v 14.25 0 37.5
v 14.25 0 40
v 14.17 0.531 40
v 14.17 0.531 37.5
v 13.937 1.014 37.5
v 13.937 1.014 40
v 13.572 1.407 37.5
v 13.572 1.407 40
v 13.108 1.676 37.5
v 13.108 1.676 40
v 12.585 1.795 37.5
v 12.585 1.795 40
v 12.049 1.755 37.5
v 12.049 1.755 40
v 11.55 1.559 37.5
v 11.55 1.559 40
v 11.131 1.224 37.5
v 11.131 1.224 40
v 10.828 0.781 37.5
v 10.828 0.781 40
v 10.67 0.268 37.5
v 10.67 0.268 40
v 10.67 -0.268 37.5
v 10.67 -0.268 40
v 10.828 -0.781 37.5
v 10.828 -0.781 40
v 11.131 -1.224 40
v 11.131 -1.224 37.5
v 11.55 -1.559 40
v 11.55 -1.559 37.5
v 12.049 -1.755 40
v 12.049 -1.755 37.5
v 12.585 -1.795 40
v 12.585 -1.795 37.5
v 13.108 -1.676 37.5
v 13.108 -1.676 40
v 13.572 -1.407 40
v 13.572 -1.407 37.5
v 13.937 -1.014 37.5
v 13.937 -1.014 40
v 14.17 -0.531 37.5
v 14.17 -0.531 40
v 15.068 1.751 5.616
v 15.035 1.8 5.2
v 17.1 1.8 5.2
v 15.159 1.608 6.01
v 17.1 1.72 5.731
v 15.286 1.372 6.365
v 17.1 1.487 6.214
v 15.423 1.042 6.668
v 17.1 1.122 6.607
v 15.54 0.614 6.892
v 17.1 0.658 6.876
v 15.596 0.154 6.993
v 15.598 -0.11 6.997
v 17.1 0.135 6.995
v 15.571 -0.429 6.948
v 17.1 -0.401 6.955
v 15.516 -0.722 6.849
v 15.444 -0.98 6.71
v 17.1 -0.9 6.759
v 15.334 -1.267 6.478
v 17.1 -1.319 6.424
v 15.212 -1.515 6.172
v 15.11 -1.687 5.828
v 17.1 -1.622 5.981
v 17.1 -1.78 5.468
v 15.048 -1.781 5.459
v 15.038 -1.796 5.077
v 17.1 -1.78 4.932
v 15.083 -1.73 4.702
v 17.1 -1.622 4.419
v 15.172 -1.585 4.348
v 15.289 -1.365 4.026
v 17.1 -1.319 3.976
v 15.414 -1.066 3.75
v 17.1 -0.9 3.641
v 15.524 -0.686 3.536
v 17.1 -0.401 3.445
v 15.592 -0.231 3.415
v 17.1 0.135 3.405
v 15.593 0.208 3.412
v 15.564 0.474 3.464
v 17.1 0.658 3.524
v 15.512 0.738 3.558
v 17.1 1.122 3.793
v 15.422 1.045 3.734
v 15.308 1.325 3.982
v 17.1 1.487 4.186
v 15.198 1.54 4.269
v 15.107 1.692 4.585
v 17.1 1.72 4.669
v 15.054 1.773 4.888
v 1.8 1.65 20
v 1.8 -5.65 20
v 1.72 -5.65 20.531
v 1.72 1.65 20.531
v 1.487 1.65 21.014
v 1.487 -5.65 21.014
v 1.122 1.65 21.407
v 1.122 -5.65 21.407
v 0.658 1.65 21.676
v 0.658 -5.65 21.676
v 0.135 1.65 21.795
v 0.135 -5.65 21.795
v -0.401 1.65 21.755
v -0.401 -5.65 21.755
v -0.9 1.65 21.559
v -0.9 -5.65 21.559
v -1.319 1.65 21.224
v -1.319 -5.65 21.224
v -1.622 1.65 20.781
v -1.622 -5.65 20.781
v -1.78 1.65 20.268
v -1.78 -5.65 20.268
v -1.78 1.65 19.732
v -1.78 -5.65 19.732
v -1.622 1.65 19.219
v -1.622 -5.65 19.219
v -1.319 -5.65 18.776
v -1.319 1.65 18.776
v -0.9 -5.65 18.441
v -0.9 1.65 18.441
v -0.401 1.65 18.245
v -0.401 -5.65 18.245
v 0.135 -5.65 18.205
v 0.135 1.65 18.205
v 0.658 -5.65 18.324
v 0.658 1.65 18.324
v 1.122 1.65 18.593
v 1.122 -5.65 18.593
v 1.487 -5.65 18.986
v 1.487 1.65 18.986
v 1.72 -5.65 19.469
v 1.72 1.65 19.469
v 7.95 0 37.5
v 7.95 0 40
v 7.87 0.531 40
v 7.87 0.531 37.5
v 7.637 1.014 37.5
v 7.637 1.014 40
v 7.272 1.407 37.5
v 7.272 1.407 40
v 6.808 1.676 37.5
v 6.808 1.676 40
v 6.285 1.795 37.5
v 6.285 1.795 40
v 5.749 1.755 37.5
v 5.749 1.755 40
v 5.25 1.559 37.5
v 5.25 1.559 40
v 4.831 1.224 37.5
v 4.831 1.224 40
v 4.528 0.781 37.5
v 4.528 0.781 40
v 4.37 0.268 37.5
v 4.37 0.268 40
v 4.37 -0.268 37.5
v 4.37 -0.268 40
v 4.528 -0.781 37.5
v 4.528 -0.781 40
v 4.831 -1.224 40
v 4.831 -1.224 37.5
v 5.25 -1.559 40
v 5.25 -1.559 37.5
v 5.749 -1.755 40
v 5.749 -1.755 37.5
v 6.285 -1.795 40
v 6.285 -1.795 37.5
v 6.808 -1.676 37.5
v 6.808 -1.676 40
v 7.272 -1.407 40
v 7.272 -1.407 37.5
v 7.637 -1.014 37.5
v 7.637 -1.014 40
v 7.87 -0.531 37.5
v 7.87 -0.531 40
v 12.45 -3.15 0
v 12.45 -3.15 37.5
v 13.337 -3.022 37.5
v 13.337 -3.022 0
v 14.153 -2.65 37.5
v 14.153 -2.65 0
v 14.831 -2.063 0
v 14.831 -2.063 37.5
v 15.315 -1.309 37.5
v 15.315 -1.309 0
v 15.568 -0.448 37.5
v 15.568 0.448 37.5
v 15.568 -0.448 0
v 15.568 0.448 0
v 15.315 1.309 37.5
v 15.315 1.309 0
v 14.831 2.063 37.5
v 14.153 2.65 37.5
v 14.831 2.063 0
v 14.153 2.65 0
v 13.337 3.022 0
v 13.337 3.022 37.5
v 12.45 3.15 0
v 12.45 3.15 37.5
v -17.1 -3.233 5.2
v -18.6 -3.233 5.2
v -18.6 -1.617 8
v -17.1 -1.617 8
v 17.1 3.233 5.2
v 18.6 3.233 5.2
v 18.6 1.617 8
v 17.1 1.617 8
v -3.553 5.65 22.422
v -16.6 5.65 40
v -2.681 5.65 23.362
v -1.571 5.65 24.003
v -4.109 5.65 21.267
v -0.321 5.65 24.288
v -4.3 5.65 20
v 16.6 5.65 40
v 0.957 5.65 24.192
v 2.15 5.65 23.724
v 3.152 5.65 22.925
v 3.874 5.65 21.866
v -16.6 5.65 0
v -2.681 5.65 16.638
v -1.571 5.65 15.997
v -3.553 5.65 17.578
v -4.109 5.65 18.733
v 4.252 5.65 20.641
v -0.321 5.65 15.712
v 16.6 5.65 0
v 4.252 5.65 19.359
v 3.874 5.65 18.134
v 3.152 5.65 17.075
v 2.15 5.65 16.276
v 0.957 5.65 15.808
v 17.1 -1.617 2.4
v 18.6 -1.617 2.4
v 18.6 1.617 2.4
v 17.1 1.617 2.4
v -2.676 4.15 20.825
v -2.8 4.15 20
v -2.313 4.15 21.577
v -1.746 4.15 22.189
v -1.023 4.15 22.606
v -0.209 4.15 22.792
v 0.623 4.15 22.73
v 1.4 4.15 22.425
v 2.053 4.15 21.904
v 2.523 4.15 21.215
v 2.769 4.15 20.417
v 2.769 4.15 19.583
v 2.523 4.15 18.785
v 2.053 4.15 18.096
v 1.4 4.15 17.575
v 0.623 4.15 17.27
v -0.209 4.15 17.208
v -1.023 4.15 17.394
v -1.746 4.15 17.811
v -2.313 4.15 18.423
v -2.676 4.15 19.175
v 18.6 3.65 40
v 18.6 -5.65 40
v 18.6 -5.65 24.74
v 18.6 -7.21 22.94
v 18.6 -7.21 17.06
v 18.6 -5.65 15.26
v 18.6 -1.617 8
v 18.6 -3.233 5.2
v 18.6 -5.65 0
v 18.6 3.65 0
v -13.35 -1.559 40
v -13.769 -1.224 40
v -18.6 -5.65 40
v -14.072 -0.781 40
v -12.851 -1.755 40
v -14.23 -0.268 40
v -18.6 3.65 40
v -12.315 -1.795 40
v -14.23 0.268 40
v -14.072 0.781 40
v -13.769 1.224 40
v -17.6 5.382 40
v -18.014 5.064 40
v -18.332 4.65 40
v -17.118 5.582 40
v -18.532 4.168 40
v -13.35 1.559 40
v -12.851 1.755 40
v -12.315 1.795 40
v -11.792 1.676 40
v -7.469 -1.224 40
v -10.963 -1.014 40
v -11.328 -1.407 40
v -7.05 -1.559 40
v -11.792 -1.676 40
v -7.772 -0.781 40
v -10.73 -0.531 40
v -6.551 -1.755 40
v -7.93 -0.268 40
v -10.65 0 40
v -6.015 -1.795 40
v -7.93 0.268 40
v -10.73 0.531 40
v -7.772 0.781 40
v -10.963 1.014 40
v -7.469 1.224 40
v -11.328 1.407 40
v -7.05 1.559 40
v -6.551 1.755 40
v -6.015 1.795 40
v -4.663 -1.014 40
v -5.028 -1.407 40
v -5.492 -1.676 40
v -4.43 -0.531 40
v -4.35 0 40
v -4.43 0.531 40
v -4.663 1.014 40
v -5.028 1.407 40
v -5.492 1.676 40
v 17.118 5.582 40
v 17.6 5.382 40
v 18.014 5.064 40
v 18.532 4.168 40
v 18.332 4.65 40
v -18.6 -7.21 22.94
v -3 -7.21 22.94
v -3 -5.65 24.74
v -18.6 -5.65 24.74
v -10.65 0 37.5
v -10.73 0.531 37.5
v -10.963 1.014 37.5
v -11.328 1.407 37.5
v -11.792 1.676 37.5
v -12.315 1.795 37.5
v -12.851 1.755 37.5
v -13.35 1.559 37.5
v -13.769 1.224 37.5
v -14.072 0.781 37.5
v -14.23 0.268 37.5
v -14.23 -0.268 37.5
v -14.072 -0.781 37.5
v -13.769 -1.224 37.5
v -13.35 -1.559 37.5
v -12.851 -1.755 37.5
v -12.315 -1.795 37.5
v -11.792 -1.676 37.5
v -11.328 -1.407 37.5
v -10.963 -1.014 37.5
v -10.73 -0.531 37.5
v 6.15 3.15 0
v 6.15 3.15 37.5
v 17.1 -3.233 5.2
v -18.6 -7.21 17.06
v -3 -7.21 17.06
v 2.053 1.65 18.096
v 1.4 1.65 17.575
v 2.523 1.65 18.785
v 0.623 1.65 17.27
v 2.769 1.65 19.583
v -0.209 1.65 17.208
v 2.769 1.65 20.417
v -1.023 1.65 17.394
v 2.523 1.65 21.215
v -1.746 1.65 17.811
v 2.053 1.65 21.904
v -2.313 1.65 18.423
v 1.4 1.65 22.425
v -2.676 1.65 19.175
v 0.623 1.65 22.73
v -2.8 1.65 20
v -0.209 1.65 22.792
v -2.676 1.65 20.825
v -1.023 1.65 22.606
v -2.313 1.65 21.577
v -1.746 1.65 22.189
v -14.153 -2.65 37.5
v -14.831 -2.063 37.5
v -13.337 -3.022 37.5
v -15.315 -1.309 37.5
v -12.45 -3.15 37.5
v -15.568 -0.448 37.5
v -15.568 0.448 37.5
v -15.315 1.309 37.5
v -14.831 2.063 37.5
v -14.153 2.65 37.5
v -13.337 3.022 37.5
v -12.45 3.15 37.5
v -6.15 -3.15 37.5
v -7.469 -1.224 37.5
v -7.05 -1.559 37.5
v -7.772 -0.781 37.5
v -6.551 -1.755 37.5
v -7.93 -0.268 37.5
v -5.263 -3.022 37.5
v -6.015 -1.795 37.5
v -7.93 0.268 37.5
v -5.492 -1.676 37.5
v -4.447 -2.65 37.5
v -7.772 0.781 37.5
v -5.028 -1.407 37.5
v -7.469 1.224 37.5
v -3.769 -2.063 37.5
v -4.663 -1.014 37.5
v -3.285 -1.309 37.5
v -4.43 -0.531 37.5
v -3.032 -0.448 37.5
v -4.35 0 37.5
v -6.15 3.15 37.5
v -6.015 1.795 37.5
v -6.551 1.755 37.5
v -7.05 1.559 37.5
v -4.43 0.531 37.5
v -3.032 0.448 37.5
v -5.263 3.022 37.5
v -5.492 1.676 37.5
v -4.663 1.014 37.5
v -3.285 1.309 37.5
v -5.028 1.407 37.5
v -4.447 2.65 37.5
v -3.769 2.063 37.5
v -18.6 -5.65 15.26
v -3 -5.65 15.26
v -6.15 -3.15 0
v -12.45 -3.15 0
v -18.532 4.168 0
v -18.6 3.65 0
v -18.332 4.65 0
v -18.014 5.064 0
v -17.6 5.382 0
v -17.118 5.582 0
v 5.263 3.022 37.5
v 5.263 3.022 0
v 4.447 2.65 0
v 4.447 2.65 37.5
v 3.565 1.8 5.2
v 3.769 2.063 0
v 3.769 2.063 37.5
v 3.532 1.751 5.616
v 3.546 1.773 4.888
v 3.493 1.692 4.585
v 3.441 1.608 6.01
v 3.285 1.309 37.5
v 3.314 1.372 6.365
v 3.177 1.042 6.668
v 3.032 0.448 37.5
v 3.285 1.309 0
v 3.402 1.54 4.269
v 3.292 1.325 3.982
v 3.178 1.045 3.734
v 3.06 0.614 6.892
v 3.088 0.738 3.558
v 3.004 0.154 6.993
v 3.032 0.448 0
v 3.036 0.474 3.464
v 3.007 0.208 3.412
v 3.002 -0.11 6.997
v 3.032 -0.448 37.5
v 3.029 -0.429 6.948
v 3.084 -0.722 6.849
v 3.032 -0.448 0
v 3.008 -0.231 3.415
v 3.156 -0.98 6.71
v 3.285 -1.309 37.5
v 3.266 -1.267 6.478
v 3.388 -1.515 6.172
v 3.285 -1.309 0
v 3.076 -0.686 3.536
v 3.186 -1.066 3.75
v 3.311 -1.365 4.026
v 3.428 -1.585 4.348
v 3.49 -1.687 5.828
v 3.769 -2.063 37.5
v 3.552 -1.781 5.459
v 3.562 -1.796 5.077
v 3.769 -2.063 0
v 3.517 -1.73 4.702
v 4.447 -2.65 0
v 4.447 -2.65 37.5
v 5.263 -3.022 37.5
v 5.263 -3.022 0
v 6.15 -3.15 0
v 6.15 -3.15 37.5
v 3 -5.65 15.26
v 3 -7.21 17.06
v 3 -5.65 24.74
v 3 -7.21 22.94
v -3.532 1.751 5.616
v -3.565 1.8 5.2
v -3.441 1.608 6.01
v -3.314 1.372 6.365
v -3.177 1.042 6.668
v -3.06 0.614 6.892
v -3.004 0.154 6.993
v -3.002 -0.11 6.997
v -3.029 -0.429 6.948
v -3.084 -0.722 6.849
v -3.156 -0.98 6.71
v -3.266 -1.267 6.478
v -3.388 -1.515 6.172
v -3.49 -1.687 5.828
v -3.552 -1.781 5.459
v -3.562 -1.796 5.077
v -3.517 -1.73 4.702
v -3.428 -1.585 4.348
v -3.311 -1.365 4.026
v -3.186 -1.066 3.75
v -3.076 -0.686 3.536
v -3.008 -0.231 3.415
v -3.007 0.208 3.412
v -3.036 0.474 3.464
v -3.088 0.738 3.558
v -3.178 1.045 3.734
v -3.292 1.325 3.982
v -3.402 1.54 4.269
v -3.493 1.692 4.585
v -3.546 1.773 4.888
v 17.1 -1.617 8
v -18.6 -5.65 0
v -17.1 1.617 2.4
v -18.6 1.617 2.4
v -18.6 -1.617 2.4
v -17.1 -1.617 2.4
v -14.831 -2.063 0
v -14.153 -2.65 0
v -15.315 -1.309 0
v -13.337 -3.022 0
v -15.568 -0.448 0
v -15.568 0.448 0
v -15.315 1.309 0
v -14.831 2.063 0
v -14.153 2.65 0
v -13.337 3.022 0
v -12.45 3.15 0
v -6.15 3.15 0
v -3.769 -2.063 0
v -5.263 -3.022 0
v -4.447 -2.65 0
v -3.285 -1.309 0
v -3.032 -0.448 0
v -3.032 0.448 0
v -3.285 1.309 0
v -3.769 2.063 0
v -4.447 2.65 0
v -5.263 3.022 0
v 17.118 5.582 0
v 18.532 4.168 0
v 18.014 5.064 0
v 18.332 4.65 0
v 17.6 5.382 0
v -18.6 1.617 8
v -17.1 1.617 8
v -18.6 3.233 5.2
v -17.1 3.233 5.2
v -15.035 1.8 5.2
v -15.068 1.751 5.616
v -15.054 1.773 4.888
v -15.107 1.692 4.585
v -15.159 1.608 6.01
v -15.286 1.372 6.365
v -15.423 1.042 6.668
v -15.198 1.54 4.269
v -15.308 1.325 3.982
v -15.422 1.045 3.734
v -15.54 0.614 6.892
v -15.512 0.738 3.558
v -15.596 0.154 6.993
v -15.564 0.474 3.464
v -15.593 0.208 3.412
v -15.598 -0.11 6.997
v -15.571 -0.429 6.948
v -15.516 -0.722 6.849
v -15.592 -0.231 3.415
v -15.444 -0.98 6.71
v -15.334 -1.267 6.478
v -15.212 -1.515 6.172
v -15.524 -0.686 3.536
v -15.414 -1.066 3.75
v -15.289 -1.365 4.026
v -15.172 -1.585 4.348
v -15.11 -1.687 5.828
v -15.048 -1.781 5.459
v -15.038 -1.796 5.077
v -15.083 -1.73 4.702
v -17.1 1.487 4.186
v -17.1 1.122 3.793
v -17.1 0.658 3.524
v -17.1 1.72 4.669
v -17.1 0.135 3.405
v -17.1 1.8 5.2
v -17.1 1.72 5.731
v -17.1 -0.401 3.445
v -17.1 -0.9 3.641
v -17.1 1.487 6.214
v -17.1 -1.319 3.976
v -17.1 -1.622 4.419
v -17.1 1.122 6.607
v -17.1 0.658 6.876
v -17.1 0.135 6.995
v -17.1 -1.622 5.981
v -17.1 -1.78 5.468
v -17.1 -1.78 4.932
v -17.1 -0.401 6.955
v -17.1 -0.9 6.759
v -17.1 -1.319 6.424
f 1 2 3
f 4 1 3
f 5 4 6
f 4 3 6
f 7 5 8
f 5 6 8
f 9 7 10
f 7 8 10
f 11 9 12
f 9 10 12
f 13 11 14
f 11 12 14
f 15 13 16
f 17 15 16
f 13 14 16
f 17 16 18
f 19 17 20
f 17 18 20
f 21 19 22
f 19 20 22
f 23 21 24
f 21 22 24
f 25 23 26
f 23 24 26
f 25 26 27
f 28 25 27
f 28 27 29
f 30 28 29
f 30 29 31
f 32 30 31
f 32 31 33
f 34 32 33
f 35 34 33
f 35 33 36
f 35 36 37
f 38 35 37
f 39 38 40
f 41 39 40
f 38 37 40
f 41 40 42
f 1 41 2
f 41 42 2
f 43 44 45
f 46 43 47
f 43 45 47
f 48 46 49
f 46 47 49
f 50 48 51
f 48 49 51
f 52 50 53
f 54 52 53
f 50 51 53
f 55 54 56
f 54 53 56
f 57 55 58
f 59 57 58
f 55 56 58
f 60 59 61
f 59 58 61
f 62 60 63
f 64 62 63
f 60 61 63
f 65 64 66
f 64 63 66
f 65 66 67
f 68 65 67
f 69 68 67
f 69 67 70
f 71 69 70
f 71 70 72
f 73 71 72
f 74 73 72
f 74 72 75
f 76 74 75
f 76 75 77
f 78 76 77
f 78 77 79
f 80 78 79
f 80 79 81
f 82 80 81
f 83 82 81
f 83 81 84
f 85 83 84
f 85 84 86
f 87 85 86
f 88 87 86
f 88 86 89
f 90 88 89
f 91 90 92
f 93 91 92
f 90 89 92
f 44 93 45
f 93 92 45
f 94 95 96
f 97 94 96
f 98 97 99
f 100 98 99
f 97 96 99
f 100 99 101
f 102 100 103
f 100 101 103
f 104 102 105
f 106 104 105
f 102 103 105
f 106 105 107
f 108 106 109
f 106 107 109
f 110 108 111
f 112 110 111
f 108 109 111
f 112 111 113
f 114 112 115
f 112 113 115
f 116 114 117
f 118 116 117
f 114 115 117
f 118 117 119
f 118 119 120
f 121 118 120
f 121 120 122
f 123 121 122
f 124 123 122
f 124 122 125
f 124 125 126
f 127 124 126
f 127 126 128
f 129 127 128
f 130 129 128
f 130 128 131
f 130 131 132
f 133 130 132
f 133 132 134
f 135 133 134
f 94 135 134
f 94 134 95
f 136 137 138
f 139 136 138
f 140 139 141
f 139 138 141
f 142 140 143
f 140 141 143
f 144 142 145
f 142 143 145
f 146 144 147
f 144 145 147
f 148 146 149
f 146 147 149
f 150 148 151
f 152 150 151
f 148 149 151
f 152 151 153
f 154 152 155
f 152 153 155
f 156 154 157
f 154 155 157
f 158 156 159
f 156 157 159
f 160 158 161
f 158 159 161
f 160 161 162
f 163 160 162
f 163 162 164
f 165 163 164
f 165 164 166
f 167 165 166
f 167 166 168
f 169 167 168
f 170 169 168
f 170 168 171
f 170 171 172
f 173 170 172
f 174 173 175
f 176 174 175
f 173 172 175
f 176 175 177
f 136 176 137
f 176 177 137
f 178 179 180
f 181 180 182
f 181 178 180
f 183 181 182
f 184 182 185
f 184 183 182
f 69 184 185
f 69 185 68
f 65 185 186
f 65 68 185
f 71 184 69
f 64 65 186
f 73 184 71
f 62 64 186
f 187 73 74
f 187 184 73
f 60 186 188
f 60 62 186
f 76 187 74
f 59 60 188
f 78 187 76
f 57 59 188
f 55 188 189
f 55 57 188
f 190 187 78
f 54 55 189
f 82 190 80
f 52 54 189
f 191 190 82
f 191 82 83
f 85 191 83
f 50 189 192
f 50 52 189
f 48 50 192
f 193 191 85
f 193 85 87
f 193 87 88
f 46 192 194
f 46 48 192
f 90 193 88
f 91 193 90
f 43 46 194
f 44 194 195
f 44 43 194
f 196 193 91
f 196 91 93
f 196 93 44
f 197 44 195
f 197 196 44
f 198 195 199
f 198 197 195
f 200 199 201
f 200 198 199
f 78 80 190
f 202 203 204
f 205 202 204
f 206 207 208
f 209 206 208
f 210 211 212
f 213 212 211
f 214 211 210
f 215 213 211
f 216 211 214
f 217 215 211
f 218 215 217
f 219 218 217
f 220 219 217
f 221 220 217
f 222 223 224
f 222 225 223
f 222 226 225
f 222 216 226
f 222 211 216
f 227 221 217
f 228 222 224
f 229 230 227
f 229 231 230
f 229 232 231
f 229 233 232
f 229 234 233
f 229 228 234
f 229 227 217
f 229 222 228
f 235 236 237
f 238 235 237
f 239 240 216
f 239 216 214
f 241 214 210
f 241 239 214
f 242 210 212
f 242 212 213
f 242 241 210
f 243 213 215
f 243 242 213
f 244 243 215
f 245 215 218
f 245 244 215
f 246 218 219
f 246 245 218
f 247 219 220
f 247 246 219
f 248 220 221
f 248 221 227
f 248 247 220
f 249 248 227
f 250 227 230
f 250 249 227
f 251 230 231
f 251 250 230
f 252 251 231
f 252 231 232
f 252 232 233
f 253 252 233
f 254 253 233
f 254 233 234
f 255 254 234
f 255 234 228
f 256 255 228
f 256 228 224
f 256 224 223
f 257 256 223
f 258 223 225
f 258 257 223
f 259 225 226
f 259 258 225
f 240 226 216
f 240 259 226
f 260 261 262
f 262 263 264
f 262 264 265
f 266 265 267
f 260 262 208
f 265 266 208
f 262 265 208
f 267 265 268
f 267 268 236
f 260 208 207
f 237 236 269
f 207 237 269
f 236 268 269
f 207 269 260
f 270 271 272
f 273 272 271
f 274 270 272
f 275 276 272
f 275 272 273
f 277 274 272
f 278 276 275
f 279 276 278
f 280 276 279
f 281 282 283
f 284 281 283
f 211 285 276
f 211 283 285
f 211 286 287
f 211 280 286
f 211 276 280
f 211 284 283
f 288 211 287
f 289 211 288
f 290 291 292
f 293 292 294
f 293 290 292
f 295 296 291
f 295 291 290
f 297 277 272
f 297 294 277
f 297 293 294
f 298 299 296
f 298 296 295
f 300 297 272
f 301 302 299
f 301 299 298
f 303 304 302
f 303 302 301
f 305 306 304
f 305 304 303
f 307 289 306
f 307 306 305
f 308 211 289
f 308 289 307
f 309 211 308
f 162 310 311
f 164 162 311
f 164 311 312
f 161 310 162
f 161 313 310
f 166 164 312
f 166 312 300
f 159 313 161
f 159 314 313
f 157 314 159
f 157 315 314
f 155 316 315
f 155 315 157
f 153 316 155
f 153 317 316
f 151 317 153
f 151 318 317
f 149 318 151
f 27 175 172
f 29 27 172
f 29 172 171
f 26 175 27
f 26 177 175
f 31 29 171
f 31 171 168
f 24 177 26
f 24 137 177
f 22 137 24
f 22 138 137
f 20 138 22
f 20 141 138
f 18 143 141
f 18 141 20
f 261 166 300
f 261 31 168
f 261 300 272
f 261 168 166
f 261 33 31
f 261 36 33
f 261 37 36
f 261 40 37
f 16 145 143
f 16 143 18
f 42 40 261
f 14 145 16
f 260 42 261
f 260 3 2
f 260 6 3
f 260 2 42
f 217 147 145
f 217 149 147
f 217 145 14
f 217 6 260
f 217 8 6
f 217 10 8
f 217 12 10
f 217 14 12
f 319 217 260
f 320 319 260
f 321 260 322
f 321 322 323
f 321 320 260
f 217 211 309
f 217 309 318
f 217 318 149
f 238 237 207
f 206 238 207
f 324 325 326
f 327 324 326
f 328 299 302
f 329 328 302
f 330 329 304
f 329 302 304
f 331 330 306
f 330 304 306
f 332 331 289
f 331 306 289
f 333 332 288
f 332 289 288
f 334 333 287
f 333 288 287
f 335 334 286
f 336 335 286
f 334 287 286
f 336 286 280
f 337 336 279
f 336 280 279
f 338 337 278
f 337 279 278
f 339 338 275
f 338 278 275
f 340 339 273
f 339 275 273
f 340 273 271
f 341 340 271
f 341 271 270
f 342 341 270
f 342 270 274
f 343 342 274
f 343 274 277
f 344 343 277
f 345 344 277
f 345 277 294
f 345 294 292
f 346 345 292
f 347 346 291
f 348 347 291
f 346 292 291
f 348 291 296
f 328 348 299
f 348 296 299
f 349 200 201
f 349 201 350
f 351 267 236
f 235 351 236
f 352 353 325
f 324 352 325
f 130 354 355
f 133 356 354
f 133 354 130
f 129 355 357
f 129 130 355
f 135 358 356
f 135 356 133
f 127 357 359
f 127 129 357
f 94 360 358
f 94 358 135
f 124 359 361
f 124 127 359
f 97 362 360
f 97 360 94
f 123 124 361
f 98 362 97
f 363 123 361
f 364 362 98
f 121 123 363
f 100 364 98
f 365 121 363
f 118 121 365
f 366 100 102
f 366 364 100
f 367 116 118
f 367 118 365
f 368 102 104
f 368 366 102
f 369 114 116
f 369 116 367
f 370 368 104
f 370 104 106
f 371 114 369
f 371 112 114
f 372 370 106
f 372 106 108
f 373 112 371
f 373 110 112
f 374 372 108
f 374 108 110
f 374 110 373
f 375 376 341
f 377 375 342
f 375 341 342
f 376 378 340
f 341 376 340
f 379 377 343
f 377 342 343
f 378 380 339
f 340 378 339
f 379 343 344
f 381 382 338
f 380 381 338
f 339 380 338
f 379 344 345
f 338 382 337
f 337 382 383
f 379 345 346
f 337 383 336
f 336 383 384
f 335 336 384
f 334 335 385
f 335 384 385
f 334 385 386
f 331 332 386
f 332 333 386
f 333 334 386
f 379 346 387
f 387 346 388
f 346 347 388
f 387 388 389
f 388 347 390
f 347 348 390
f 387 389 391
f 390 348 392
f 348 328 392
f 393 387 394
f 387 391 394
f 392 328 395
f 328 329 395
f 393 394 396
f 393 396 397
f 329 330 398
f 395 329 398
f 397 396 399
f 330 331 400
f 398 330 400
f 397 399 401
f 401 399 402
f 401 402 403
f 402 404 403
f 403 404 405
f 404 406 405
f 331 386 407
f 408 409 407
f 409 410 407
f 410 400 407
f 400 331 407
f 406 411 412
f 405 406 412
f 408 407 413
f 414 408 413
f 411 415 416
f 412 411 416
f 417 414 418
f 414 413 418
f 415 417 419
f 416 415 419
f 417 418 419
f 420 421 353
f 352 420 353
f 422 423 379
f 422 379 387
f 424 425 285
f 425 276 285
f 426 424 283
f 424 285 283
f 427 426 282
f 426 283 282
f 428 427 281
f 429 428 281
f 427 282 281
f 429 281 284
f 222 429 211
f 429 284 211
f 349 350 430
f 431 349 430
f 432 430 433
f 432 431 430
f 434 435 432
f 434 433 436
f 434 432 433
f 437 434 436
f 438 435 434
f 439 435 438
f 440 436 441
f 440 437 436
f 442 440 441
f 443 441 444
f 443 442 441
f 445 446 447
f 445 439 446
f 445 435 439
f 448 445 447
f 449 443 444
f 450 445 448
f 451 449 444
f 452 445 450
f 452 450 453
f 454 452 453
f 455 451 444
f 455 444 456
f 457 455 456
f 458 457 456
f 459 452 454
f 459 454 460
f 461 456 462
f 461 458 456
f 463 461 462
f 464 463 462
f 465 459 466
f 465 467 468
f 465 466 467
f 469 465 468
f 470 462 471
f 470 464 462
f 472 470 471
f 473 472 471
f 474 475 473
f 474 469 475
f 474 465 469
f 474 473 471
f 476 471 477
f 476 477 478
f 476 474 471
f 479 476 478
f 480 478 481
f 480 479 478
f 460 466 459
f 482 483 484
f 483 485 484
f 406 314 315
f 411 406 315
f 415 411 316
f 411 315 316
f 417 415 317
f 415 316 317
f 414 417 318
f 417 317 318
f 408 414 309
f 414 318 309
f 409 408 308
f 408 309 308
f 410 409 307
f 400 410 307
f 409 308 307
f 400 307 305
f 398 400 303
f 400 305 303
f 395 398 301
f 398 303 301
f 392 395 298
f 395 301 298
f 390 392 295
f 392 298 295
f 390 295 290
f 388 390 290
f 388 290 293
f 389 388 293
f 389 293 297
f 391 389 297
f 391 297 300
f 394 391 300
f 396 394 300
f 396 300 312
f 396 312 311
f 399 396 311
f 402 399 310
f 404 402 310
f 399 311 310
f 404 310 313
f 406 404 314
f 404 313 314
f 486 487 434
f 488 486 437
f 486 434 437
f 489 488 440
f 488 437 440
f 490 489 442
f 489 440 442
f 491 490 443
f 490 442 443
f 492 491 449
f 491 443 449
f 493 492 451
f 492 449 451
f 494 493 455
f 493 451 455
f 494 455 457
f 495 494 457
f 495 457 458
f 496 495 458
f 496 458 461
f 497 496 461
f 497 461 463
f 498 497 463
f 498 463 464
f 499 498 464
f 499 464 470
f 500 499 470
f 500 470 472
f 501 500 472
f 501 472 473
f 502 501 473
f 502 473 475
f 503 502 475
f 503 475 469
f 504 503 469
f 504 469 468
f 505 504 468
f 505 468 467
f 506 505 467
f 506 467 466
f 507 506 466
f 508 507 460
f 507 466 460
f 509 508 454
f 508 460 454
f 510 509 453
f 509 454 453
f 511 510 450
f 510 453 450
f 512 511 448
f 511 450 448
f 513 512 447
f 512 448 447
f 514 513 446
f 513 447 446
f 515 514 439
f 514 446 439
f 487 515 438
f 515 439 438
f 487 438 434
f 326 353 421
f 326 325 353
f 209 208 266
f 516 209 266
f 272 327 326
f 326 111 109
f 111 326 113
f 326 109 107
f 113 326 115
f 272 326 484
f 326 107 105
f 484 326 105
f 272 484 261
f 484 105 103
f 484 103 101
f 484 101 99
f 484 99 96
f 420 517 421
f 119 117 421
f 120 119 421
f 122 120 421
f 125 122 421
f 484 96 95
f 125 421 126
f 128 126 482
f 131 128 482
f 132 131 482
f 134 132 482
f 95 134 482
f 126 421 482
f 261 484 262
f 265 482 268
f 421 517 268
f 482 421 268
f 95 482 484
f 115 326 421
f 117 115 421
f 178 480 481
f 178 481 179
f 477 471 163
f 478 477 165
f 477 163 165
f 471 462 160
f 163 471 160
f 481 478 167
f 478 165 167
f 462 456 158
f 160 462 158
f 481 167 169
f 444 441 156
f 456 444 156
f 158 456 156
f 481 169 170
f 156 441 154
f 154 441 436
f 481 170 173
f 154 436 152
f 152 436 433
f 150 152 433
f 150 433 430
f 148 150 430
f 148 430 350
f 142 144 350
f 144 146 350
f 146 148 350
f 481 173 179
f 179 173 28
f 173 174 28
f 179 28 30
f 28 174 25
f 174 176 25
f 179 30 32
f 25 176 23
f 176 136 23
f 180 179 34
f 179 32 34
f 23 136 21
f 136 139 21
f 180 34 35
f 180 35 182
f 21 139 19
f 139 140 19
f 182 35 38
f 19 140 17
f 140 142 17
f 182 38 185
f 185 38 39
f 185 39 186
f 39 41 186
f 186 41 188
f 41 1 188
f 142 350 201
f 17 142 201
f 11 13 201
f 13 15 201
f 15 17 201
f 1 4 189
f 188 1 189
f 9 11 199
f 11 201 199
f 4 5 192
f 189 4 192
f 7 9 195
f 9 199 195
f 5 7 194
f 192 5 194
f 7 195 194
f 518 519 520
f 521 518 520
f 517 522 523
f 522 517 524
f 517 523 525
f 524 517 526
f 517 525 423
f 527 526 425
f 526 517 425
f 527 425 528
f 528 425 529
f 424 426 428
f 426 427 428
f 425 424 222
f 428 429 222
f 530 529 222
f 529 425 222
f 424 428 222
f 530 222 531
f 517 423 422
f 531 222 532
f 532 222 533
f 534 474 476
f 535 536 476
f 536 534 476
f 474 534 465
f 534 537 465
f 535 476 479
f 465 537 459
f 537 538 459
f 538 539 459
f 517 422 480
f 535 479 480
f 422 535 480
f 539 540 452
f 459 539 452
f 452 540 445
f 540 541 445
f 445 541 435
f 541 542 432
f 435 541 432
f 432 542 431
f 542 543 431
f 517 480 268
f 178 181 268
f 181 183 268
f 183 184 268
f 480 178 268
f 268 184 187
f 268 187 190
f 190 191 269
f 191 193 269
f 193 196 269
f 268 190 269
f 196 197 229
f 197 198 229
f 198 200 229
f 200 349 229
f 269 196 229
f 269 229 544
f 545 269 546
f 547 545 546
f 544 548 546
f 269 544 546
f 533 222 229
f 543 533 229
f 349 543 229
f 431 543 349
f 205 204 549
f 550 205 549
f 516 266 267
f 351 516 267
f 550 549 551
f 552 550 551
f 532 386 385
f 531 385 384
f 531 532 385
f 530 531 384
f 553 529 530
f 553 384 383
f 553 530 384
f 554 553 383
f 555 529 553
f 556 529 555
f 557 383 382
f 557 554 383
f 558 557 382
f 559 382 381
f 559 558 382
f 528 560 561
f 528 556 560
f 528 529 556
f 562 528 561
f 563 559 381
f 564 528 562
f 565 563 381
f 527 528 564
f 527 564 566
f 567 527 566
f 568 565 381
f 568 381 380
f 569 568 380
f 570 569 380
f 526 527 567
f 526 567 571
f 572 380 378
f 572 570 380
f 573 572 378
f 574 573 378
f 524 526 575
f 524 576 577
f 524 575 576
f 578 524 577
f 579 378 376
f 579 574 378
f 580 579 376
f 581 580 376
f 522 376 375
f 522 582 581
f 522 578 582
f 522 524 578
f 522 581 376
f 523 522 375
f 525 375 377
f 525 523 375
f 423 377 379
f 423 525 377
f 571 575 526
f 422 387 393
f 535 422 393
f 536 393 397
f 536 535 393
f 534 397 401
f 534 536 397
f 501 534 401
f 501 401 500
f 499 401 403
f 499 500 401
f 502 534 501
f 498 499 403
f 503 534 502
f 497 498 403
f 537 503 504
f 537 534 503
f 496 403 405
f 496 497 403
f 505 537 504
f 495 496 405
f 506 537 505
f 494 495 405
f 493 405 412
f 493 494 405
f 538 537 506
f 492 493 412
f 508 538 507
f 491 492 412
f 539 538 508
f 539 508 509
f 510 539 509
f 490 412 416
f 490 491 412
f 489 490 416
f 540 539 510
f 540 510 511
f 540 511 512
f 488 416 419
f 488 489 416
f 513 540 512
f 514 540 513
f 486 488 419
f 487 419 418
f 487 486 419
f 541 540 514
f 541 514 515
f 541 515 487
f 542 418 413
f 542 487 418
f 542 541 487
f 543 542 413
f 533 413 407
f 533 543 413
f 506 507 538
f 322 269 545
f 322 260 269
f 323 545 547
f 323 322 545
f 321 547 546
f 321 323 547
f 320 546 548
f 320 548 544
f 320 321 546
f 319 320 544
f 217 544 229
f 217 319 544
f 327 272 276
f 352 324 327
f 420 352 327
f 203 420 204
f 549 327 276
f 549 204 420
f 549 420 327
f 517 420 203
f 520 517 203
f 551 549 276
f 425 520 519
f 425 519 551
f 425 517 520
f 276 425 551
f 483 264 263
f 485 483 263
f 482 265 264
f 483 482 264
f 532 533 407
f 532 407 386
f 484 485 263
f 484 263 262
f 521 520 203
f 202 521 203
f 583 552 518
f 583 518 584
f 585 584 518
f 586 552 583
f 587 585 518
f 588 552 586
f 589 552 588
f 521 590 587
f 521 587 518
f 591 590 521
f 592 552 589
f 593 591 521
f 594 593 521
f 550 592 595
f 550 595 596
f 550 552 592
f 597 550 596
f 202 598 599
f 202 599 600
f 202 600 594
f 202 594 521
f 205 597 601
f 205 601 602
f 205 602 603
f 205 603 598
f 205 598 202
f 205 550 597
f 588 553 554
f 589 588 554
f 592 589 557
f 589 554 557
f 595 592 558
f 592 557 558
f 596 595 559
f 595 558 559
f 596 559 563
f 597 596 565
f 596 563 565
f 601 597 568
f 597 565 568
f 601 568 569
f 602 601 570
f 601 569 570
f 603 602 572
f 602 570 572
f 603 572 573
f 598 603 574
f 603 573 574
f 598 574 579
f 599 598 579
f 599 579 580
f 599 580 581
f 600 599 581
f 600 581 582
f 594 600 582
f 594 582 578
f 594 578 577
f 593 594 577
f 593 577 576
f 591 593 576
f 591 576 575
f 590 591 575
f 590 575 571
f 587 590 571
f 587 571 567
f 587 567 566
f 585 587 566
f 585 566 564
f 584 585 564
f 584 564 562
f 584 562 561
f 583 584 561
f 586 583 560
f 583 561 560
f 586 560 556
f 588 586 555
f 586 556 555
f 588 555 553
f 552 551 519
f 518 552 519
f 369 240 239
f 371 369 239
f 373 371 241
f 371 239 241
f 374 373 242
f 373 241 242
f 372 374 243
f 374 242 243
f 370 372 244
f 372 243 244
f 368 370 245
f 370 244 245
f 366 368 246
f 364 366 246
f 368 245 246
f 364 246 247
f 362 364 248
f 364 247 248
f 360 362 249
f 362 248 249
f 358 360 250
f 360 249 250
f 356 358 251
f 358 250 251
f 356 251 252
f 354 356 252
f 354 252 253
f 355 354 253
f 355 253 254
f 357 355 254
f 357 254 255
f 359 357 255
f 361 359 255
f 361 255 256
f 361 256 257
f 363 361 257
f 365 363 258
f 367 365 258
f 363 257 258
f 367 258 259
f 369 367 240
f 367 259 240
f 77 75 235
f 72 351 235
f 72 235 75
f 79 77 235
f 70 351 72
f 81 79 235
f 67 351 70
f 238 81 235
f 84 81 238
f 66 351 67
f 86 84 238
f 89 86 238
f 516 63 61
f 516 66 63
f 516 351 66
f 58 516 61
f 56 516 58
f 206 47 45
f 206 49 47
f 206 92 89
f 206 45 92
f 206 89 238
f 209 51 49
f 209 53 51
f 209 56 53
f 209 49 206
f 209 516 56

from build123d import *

# Parameters (mm, degrees)
SKETCH_W        = 37.2
SKETCH_H        = 11.3
PAD_DEPTH       = 40
SKETCH001_R     = 1.8
PAD001_DEPTH    = 2.5
PAD002_DEPTH    = 37.2
SKETCH003_R     = 1.8
POCKET_DEPTH    = 12.861
SKETCH004_W     = 6
SKETCH004_H     = 9.48
POCKET001_DEPTH = 1.56
SKETCH005_R     = 2.8
POCKET002_DEPTH = 4
SKETCH006_R     = 1.8
POCKET003_DEPTH = 37.201
POCKET004_DEPTH = 1.5
POCKET005_DEPTH = 1.5
FILLET_R        = 2
CHAMFER_SIZE    = 1.5


with BuildPart() as part:
    # Sketch → Pad (new body)
    with BuildSketch(Plane.XY):
        Rectangle(SKETCH_W, SKETCH_H)
        with BuildLine():
            ThreePointArc((-12.45, 3.15), (-15.6, 0), (-12.45, -3.15))
            Line((-12.45, -3.15), (-6.15, -3.15))
            ThreePointArc((-6.15, -3.15), (-3, 0), (-6.15, 3.15))
            Line((-6.15, 3.15), (-12.45, 3.15))
        make_face(mode=Mode.SUBTRACT)
        with BuildLine():
            ThreePointArc((12.45, -3.15), (15.6, 0), (12.45, 3.15))
            Line((12.45, 3.15), (6.15, 3.15))
            ThreePointArc((6.15, 3.15), (3, 0), (6.15, -3.15))
            Line((6.15, -3.15), (12.45, -3.15))
        make_face(mode=Mode.SUBTRACT)
    extrude(amount=PAD_DEPTH)

    # Sketch001 (on Face14 of Pad) → Pad001 (join)
    with BuildSketch(Plane.XY.offset(40)):
        with BuildLine():
            ThreePointArc((-12.45, 3.15), (-15.6, 0), (-12.45, -3.15))
            Line((-12.45, -3.15), (-6.15, -3.15))
            ThreePointArc((-6.15, -3.15), (-3, 0), (-6.15, 3.15))
            Line((-6.15, 3.15), (-12.45, 3.15))
        make_face()
        with Locations((-12.45, 0)):
            Circle(SKETCH001_R, mode=Mode.SUBTRACT)
        with Locations((-6.15, 0)):
            Circle(SKETCH001_R, mode=Mode.SUBTRACT)
        with BuildLine():
            ThreePointArc((12.45, -3.15), (15.6, 0), (12.45, 3.15))
            Line((12.45, 3.15), (6.15, 3.15))
            ThreePointArc((6.15, 3.15), (3, 0), (6.15, -3.15))
            Line((6.15, -3.15), (12.45, -3.15))
        make_face()
        with Locations((6.15, 0)):
            Circle(SKETCH001_R, mode=Mode.SUBTRACT)
        with Locations((12.45, 0)):
            Circle(SKETCH001_R, mode=Mode.SUBTRACT)
    extrude(amount=-PAD001_DEPTH)

    # Sketch002 (on Face3 of Pad001) → Pad002 (join)
    with BuildSketch(Plane.YZ.offset(18.6)):
        Polygon((-5.65, 24.74), (-5.65, 15.26), (-7.21, 17.06), (-7.21, 22.94), align=None)
    extrude(amount=-PAD002_DEPTH)

    # Sketch003 (on Face22 of Pad002) → Pocket (cut, through all)
    with BuildSketch(Plane.XZ.offset(7.21)):
        with Locations((0, 20)):
            Circle(SKETCH003_R)
    extrude(amount=-POCKET_DEPTH, mode=Mode.SUBTRACT)

    # Sketch004 (on Face21 of Pocket) → Pocket001 (cut)
    with BuildSketch(Plane.XZ.offset(7.21)):
        with Locations((0, 20)):
            Rectangle(SKETCH004_W, SKETCH004_H)
    extrude(amount=-POCKET001_DEPTH, mode=Mode.SUBTRACT)

    # Sketch005 (on Face1 of Pocket001) → Pocket002 (cut)
    with BuildSketch(Plane(origin=(0, 5.65, 0), x_dir=(-1, 0, 0), z_dir=(0, 1, 0))):
        with Locations((0, 20)):
            Circle(SKETCH005_R)
    extrude(amount=-POCKET002_DEPTH, mode=Mode.SUBTRACT)

    # Sketch006 (on Face5 of Pocket002) → Pocket003 (cut, through all)
    with BuildSketch(Plane.YZ.offset(18.6)):
        with Locations((0, 5.2)):
            Circle(SKETCH006_R)
    extrude(amount=-POCKET003_DEPTH, mode=Mode.SUBTRACT)

    # Sketch007 (on Face5 of Pocket003) → Pocket004 (cut)
    with BuildSketch(Plane.YZ.offset(18.6)):
        Polygon((1.616581, 8), (-1.616581, 8), (-3.233162, 5.2), (-1.616581, 2.4), (1.616581, 2.4), (3.233162, 5.2), align=None)
    extrude(amount=-POCKET004_DEPTH, mode=Mode.SUBTRACT)

    # Sketch008 (on Face2 of Pocket004) → Pocket005 (cut)
    with BuildSketch(Plane(origin=(-18.6, 0, 0), x_dir=(0, -1, 0), z_dir=(-1, 0, 0))):
        Polygon((1.616581, 8), (-1.616581, 8), (-3.233162, 5.2), (-1.616581, 2.4), (1.616581, 2.4), (3.233162, 5.2), align=None)
    extrude(amount=-POCKET005_DEPTH, mode=Mode.SUBTRACT)

    # Fillet
    fillet_edges = [part.edges().sort_by_distance(p)[0] for p in [
        (-18.6, 5.65, 20),
        (18.6, 5.65, 20),
    ]]
    fillet(fillet_edges, radius=FILLET_R)

    # Chamfer
    chamfer_edges = [part.edges().sort_by_distance(p)[0] for p in [
        (2.8, 5.65, 20),
    ]]
    chamfer(chamfer_edges, length=CHAMFER_SIZE)


solid = part.part
